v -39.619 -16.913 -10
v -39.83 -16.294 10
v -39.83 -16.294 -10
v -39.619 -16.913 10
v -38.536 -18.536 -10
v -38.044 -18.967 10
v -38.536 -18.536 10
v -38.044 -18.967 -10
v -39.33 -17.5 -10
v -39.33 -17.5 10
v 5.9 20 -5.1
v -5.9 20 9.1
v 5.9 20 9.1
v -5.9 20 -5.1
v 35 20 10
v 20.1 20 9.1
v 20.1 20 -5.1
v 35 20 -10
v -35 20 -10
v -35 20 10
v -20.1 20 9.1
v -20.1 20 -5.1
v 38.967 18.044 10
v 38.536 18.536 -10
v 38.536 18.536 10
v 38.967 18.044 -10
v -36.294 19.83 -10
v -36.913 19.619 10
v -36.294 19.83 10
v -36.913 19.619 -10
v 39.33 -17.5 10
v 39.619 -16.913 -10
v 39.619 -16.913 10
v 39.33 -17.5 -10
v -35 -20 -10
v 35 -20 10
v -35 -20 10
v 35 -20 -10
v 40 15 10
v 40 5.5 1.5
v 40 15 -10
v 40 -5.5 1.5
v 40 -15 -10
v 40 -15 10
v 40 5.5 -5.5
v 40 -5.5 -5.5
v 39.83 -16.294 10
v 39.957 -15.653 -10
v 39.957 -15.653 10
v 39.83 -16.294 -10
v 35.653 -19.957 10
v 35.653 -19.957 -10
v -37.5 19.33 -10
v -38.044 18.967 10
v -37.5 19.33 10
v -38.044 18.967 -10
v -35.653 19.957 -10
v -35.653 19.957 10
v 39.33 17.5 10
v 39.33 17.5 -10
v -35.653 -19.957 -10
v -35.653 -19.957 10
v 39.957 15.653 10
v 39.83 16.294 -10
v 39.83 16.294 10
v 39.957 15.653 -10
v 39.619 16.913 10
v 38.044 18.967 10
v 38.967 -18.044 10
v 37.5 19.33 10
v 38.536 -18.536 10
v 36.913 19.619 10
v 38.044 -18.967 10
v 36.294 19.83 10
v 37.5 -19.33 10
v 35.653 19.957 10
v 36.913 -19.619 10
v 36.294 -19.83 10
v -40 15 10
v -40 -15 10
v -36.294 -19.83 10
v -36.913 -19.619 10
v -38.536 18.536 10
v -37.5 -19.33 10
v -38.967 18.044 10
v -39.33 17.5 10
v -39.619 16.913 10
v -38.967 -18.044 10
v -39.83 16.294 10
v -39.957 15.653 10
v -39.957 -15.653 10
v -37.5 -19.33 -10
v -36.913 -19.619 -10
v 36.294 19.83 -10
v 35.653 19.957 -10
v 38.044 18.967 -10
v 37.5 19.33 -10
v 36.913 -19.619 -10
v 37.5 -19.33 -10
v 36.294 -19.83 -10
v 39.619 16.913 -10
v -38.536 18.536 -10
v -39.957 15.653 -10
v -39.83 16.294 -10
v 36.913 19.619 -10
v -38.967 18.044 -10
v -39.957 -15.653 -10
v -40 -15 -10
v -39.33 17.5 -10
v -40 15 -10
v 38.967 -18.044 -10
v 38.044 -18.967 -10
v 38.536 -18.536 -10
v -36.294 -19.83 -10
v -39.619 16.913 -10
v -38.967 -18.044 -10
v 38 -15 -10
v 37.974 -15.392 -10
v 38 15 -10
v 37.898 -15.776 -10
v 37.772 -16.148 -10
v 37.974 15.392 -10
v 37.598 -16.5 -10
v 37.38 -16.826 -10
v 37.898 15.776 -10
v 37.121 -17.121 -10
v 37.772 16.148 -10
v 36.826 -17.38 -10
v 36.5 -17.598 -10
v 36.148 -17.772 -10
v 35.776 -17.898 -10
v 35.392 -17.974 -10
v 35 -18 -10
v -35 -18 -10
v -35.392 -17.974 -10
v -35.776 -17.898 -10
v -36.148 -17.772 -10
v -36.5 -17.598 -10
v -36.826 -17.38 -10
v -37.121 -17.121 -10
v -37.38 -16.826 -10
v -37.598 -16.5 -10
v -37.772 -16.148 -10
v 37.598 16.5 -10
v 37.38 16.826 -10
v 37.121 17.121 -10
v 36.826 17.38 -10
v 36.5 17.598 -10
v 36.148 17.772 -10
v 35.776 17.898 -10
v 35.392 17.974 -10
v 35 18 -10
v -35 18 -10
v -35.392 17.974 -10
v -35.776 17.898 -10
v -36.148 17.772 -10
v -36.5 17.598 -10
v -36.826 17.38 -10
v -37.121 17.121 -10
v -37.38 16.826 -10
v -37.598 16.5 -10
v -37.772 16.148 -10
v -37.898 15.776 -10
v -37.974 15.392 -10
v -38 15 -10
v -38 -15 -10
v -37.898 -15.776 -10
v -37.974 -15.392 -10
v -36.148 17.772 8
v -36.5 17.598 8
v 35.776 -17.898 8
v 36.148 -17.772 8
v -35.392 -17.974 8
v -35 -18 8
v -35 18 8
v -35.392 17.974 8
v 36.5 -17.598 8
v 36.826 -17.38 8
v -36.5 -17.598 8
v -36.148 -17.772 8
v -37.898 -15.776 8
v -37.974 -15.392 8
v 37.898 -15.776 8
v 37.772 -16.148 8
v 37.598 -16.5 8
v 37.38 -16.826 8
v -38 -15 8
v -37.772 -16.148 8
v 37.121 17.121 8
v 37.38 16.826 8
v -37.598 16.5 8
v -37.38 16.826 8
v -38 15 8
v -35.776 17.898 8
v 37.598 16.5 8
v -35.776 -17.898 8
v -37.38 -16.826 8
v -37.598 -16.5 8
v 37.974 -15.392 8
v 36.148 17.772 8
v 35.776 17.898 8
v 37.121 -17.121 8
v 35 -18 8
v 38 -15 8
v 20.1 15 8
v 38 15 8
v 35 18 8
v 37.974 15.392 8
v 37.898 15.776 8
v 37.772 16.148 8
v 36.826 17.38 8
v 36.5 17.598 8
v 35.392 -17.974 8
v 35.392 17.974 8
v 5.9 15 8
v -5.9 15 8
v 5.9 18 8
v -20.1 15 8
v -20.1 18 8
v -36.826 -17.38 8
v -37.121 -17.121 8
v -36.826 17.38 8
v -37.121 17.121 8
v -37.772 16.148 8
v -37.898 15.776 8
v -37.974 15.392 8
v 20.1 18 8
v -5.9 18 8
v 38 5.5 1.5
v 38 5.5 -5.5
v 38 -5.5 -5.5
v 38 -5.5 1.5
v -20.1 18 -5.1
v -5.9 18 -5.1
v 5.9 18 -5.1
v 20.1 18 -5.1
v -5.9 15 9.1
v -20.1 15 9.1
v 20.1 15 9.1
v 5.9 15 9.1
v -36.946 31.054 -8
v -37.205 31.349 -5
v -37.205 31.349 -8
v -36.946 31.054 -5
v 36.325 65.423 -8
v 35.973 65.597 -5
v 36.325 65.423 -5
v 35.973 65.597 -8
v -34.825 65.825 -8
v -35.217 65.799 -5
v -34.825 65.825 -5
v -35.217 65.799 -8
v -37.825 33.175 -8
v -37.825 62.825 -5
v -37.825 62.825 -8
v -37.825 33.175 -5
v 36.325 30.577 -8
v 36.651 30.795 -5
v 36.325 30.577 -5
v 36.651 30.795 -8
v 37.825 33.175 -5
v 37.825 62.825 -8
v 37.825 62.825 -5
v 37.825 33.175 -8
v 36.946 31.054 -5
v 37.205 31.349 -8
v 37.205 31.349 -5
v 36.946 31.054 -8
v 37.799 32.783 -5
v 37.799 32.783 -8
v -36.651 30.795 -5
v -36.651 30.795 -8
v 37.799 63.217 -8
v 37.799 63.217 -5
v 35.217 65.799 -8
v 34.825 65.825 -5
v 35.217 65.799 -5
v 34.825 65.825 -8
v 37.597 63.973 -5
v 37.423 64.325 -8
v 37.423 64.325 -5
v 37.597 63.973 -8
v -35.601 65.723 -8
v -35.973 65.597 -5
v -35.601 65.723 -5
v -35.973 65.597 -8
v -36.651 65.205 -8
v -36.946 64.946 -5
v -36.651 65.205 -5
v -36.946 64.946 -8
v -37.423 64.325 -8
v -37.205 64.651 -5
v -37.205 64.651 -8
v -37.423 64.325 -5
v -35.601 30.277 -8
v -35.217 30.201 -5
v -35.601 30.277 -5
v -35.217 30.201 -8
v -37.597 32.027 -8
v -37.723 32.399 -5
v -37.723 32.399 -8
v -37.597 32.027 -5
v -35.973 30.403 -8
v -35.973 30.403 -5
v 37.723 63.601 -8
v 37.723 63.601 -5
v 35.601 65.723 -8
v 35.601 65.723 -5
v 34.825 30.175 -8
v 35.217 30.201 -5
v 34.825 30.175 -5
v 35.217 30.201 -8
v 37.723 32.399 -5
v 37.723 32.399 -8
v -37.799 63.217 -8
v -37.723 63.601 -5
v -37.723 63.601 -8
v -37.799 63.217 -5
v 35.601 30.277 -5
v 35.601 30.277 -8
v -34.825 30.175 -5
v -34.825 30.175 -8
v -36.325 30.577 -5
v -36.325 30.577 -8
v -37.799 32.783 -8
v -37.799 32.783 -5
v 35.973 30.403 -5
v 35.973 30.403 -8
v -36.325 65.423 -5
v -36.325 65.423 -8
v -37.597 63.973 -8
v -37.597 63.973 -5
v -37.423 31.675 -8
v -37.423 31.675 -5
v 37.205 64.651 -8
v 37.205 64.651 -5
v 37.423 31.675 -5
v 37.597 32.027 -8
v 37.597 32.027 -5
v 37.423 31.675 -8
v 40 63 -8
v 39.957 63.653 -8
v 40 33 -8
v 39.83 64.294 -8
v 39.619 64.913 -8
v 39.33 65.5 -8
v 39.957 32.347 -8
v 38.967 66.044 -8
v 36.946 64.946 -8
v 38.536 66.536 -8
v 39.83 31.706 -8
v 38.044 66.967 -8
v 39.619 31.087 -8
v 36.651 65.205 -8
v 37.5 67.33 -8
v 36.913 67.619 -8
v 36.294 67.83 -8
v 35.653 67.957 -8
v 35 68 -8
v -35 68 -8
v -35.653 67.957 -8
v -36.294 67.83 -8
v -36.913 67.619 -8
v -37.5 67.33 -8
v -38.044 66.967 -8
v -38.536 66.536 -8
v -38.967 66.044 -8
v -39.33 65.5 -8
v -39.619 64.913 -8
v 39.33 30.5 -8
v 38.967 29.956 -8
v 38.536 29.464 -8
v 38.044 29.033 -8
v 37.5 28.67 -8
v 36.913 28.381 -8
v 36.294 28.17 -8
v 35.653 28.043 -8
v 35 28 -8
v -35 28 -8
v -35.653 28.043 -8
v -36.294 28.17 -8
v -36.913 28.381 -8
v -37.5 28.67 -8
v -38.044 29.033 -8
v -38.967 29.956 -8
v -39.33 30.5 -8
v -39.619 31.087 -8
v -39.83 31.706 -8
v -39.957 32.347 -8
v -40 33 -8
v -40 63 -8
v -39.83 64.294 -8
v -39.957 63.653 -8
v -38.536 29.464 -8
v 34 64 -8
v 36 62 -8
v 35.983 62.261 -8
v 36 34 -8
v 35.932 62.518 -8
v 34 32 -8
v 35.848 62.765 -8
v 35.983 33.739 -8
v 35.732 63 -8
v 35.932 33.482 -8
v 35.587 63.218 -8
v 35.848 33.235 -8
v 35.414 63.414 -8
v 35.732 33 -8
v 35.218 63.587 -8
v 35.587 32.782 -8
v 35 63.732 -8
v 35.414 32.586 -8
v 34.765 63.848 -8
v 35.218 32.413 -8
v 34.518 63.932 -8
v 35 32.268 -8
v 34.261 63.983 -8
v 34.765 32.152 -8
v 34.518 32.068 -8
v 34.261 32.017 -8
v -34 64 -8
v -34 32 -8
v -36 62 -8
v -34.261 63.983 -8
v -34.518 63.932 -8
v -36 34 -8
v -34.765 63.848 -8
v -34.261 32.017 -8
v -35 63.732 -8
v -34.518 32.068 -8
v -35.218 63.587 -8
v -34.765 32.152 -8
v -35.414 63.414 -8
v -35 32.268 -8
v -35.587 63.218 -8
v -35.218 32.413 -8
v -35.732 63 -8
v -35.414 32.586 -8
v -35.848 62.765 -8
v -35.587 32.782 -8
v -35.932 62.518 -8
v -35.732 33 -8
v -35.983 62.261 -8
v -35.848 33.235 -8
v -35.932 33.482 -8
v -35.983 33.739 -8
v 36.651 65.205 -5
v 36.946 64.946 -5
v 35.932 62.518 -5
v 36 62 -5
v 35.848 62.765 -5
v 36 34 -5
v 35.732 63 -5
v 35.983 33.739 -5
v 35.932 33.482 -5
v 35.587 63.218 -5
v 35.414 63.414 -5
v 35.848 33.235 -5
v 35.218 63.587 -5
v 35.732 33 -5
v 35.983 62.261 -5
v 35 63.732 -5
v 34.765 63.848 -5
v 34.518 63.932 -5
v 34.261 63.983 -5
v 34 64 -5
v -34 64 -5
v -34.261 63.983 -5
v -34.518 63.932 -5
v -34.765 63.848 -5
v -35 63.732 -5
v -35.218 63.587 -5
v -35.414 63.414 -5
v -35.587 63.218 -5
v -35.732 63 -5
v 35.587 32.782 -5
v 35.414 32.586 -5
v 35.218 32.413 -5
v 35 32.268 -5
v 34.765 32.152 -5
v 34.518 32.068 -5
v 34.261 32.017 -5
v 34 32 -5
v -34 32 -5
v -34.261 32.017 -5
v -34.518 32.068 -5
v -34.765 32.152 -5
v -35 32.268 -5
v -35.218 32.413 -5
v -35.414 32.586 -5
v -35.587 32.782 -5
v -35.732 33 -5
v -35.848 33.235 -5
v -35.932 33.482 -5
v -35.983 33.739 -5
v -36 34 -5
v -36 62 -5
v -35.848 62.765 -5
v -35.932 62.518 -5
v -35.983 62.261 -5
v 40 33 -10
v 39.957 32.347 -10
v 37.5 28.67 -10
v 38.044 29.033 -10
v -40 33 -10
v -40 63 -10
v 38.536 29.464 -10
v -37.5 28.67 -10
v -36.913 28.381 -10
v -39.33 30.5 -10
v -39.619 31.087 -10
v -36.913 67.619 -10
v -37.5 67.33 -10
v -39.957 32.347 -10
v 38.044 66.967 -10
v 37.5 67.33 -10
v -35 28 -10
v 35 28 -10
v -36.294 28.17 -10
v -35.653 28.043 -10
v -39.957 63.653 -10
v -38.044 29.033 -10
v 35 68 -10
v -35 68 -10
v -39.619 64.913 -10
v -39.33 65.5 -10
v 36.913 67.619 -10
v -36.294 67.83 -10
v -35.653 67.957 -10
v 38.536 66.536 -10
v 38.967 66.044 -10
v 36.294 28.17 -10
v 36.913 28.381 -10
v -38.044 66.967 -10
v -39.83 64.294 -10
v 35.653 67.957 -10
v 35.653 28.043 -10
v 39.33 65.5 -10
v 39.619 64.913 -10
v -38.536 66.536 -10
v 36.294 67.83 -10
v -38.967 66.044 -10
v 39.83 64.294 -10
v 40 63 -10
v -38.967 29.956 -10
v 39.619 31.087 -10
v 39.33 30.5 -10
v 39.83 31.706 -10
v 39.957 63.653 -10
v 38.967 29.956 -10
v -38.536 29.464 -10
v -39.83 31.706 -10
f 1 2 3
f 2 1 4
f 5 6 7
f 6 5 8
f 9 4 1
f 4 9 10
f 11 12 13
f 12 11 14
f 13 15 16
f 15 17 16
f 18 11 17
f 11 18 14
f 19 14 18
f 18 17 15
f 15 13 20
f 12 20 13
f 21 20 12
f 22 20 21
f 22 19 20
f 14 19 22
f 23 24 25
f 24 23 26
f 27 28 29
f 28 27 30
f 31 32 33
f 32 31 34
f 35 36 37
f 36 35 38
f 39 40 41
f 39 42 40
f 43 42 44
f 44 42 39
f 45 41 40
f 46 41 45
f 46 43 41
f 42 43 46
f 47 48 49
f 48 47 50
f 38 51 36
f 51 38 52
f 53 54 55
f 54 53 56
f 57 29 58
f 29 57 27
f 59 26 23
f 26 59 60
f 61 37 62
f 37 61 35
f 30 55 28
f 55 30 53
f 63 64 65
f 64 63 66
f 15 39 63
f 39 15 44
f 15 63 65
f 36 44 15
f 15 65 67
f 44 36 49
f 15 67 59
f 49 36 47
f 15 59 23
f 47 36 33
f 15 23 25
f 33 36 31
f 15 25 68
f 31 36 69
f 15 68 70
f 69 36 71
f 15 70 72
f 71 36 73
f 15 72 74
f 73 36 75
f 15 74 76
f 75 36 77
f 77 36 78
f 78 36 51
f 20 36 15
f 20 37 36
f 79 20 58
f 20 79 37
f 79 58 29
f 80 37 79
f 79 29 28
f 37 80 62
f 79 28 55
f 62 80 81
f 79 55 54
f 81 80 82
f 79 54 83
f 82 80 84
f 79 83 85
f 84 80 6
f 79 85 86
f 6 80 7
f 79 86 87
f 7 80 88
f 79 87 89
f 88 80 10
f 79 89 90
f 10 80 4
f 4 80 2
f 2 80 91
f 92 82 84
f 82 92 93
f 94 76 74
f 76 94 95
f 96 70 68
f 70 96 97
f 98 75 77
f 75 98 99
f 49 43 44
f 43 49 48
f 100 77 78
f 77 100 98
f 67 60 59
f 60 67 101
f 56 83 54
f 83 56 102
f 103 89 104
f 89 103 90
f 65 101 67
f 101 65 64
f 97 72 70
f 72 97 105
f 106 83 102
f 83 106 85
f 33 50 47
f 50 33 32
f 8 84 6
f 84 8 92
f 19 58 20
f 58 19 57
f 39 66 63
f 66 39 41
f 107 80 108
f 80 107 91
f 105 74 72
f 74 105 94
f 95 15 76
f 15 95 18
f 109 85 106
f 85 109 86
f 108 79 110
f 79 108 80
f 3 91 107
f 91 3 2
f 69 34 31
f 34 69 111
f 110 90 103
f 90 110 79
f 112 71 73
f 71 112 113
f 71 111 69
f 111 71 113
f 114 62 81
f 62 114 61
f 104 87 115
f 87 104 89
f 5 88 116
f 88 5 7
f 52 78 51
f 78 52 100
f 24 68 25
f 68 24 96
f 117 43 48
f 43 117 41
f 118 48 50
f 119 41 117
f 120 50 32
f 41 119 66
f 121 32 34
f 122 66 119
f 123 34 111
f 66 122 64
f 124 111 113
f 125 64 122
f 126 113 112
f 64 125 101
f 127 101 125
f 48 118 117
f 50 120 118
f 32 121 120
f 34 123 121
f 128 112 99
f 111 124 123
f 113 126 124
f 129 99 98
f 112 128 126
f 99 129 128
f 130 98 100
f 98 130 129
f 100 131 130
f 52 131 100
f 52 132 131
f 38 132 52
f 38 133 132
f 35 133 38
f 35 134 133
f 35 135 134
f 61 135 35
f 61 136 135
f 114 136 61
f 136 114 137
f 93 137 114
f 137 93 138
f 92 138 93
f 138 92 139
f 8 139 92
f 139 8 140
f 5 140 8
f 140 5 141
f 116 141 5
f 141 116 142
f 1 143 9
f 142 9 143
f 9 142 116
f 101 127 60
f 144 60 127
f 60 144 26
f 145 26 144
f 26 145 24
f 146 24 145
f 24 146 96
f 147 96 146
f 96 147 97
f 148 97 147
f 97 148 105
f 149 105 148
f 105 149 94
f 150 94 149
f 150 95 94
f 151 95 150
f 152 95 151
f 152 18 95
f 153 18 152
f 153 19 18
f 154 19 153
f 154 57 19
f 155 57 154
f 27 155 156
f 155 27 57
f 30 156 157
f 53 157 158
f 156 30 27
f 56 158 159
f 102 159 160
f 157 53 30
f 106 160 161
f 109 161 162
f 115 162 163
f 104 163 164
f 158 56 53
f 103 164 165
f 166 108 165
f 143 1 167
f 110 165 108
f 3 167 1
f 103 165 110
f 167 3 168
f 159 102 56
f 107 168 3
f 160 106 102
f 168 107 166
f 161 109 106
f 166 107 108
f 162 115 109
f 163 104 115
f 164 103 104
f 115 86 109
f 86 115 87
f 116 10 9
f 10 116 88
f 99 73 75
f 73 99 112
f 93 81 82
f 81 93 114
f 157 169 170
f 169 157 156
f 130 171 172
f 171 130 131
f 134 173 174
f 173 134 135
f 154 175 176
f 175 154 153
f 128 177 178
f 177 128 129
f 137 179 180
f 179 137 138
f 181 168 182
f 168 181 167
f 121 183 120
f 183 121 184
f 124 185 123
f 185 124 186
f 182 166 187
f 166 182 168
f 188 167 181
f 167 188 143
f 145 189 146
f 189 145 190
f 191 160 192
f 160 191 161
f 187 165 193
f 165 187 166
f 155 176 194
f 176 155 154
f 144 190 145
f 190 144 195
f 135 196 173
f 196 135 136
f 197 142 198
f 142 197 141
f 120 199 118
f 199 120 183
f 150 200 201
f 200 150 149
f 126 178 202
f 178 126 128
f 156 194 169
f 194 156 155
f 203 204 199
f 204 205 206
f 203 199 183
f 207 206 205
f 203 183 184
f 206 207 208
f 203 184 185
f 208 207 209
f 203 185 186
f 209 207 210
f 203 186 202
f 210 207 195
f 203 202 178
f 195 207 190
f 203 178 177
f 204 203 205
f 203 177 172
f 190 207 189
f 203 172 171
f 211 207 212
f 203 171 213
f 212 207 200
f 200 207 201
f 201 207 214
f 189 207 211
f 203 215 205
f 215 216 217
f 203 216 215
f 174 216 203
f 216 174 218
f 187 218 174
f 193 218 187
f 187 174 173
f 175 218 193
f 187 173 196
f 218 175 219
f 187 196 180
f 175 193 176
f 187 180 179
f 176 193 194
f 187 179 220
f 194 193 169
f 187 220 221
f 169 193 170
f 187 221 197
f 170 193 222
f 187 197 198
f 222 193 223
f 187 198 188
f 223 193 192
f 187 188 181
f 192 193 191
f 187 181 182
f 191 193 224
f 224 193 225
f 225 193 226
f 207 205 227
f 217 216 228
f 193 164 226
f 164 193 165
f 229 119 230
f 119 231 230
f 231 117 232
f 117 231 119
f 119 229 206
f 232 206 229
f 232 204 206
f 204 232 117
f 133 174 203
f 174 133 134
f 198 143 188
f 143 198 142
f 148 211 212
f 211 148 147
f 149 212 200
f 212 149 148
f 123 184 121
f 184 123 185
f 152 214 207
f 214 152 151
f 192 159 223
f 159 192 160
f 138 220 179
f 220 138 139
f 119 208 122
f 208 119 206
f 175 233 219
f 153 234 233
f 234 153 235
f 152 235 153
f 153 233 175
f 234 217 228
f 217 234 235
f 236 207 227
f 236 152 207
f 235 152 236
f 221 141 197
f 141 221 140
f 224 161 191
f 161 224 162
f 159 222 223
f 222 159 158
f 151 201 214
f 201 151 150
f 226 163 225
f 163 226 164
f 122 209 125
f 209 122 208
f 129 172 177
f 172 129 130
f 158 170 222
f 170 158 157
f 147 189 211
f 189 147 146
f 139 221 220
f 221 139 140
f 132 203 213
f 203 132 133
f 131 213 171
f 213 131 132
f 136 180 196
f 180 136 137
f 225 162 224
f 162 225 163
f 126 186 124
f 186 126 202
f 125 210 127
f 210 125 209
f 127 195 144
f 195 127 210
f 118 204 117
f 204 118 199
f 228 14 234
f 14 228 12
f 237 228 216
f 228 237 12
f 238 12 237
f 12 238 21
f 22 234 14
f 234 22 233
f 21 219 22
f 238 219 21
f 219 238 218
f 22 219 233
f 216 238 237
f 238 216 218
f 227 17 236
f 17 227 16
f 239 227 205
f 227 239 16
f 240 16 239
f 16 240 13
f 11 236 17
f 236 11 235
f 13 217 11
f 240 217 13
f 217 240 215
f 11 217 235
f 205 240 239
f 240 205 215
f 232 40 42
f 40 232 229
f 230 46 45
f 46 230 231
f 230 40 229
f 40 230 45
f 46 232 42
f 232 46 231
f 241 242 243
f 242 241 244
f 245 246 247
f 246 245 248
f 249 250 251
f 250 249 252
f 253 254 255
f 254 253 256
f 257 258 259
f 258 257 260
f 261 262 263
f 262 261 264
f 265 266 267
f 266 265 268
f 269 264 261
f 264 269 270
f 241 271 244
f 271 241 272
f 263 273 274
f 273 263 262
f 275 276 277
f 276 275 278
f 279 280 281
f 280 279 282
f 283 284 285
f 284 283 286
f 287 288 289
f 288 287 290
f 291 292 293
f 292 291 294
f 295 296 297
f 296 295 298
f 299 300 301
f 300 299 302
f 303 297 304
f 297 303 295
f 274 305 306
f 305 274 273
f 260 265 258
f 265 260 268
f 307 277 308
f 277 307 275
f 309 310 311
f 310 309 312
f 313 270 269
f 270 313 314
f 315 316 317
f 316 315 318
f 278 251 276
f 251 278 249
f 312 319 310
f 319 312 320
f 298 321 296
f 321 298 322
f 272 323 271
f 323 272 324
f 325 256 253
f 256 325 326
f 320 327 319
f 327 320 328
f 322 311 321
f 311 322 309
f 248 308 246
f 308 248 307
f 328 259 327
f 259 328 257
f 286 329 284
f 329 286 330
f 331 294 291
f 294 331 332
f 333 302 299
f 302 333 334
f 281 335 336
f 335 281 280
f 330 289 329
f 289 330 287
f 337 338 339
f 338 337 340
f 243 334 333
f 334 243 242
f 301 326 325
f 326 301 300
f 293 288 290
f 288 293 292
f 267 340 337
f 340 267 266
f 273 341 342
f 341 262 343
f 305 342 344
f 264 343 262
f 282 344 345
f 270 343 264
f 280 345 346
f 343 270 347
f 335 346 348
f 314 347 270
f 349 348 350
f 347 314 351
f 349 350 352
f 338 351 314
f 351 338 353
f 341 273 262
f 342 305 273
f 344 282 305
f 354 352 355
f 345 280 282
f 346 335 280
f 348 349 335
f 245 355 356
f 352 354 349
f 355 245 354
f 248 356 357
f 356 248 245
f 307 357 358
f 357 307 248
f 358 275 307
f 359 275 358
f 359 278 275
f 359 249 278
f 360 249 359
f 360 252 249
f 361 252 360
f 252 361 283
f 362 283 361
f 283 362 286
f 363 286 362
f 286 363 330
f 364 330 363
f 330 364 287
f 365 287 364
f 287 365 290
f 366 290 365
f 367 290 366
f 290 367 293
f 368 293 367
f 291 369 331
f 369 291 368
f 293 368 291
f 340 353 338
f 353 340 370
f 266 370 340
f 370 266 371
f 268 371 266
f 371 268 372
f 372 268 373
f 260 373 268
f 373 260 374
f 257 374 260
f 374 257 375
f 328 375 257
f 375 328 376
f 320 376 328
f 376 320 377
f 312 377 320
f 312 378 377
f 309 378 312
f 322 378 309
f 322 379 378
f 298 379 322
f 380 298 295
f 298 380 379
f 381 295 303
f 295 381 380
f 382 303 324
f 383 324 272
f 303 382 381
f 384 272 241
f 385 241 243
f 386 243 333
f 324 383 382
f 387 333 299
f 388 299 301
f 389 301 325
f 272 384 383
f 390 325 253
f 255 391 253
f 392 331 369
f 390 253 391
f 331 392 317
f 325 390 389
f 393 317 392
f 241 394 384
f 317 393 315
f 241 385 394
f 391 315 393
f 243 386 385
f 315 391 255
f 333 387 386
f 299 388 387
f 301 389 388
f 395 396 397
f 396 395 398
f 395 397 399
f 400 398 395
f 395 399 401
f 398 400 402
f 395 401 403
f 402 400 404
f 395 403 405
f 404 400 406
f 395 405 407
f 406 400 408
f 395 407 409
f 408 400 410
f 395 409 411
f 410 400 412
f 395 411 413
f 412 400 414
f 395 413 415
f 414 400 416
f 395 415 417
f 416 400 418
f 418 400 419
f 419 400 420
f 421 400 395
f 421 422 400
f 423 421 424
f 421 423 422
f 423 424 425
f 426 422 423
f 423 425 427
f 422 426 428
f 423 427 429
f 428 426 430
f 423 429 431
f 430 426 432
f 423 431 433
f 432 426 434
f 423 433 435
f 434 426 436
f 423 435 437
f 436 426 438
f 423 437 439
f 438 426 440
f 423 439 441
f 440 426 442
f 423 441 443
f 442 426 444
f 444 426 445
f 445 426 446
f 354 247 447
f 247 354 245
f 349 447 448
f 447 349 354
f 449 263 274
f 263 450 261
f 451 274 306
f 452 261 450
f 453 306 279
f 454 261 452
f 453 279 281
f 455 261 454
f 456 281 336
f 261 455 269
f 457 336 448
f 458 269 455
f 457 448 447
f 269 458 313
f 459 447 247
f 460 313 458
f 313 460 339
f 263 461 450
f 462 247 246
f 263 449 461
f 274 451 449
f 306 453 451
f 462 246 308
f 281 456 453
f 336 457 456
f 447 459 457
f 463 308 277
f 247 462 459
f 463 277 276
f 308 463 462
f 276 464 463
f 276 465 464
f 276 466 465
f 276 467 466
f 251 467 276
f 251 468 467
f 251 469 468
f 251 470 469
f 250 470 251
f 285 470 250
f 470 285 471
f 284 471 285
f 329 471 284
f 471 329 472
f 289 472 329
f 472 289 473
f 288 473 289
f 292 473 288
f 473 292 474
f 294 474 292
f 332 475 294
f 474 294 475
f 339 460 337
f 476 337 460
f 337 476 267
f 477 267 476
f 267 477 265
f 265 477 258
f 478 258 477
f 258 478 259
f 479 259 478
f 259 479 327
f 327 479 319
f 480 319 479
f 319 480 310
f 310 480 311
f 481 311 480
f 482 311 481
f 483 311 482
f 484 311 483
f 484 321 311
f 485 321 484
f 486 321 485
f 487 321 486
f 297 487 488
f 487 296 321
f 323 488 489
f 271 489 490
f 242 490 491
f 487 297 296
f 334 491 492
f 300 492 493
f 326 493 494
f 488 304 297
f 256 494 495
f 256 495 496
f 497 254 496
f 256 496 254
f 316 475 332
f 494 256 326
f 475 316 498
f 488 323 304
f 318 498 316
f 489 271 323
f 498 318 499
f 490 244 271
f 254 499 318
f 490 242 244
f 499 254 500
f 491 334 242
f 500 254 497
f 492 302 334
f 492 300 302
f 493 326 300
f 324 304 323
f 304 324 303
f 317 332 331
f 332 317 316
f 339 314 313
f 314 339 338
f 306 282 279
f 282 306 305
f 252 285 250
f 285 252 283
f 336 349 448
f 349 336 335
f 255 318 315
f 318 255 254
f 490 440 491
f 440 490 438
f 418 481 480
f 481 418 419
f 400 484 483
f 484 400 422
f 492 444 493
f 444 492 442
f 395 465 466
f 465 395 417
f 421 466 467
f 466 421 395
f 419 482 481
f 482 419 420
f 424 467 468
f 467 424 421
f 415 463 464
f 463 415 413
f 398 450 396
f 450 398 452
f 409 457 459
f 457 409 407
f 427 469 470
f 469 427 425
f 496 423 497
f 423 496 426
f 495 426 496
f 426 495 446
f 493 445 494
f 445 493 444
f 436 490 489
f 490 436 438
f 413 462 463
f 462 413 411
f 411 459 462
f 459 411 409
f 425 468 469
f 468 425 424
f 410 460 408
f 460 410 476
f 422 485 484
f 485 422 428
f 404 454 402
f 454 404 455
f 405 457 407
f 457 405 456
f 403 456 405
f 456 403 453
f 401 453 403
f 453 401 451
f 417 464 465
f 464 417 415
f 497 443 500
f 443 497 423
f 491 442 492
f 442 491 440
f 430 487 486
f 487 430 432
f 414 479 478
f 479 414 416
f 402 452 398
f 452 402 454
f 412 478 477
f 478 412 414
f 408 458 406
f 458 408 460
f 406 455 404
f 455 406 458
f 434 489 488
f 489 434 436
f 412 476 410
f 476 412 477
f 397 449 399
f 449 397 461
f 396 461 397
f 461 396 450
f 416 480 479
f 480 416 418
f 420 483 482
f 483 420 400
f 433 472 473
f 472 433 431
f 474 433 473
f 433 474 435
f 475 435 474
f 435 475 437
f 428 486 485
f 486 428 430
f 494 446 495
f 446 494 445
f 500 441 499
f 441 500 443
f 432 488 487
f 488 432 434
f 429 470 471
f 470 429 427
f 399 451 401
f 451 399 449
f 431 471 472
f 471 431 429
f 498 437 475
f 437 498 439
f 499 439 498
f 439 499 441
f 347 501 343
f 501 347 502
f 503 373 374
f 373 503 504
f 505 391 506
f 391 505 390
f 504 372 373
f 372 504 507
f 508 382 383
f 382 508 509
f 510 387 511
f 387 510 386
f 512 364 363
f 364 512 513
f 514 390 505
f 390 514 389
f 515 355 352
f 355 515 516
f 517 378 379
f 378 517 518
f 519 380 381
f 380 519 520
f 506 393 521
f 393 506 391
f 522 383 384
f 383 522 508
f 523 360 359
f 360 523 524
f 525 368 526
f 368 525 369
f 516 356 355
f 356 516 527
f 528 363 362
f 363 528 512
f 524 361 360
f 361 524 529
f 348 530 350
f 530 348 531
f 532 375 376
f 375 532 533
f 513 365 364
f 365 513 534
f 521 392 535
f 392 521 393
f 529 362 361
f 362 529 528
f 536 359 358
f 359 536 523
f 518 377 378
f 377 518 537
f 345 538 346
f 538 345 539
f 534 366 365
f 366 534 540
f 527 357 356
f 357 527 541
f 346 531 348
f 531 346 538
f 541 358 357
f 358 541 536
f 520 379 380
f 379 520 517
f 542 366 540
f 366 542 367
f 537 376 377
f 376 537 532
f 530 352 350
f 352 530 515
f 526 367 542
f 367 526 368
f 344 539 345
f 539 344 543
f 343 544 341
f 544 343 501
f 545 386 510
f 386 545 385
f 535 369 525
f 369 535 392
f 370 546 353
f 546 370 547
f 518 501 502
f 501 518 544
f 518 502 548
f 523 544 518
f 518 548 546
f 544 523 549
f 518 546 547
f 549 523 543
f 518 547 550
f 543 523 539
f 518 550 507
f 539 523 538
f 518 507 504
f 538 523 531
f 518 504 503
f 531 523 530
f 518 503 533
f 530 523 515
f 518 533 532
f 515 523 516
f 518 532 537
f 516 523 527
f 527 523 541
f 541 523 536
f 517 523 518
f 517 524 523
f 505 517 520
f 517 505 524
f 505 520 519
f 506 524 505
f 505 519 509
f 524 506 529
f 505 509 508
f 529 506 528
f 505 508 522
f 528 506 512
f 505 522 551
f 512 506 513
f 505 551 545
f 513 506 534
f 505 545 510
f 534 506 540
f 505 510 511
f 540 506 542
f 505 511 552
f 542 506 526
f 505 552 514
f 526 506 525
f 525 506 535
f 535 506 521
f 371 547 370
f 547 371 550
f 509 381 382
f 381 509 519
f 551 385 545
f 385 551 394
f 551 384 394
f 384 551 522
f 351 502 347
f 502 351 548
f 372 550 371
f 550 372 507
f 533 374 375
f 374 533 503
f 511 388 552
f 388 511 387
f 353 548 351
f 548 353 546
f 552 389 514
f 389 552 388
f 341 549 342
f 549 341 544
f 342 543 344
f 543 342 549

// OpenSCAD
/* Kobo BLE Page Turner Enclosure
   Side-face MX switch version
   Hold with narrow long side against index/middle fingers.
*/

$fn = 48;

// ---------- Main dimensions ----------
case_w = 80;      // length
case_h = 40;      // width
case_d = 20;      // thickness / height

wall = 2;
corner_r = 5;

// ---------- MX side switch settings ----------
mx_cut = 14.2;
mx_spacing = 26;          // distance between switch centres along length
mx_z = 2;                 // vertical position on side face
switch_side_y = case_h/2; // switches on upper long side

// ---------- USB cutout on short end ----------
usb_w = 11;
usb_h = 7;
usb_x = case_w/2;

// ---------- Lid ----------
lid_thick = 2;
lid_gap = 0.35;
lip_h = 3;

// ---------- Helpers ----------
module rounded_box(w, h, d, r) {
    hull() {
        for (x=[-w/2+r, w/2-r])
        for (y=[-h/2+r, h/2-r])
            translate([x,y,0])
                cylinder(h=d, r=r, center=true);
    }
}

// MX cutout projected through side wall.
// Shape dimensions: x = switch width along case length,
// z = switch height, y = depth through wall.
module mx_side_cutout() {
    cube([mx_cut, wall + 8, mx_cut], center=true);
}

// ---------- Top shell ----------
module top_shell() {
    difference() {
        // outer body
        rounded_box(case_w, case_h, case_d, corner_r);

        // hollow interior, open from bottom
        translate([0,0,-wall])
            rounded_box(
                case_w - 2*wall,
                case_h - 2*wall,
                case_d,
                max(corner_r - wall, 1)
            );

        // side-face MX cutouts
        translate([-mx_spacing/2, switch_side_y, mx_z])
            mx_side_cutout();

        translate([ mx_spacing/2, switch_side_y, mx_z])
            mx_side_cutout();

        // USB cutout on right short end
        translate([usb_x, 0, -2])
            cube([wall + 3, usb_w, usb_h], center=true);
    }
}

// ---------- Bottom lid ----------
module bottom_lid() {
    union() {
        rounded_box(case_w, case_h, lid_thick, corner_r);

        translate([0,0,lid_thick/2 + lip_h/2])
        difference() {
            rounded_box(
                case_w - 2*wall - lid_gap,
                case_h - 2*wall - lid_gap,
                lip_h,
                max(corner_r - wall, 1)
            );

            rounded_box(
                case_w - 2*wall - 4,
                case_h - 2*wall - 4,
                lip_h + 1,
                max(corner_r - wall - 1, 1)
            );
        }
    }
}

// ---------- Build ----------
top_shell();

translate([0, 48, -case_d/2 + lid_thick/2])
    bottom_lid();
